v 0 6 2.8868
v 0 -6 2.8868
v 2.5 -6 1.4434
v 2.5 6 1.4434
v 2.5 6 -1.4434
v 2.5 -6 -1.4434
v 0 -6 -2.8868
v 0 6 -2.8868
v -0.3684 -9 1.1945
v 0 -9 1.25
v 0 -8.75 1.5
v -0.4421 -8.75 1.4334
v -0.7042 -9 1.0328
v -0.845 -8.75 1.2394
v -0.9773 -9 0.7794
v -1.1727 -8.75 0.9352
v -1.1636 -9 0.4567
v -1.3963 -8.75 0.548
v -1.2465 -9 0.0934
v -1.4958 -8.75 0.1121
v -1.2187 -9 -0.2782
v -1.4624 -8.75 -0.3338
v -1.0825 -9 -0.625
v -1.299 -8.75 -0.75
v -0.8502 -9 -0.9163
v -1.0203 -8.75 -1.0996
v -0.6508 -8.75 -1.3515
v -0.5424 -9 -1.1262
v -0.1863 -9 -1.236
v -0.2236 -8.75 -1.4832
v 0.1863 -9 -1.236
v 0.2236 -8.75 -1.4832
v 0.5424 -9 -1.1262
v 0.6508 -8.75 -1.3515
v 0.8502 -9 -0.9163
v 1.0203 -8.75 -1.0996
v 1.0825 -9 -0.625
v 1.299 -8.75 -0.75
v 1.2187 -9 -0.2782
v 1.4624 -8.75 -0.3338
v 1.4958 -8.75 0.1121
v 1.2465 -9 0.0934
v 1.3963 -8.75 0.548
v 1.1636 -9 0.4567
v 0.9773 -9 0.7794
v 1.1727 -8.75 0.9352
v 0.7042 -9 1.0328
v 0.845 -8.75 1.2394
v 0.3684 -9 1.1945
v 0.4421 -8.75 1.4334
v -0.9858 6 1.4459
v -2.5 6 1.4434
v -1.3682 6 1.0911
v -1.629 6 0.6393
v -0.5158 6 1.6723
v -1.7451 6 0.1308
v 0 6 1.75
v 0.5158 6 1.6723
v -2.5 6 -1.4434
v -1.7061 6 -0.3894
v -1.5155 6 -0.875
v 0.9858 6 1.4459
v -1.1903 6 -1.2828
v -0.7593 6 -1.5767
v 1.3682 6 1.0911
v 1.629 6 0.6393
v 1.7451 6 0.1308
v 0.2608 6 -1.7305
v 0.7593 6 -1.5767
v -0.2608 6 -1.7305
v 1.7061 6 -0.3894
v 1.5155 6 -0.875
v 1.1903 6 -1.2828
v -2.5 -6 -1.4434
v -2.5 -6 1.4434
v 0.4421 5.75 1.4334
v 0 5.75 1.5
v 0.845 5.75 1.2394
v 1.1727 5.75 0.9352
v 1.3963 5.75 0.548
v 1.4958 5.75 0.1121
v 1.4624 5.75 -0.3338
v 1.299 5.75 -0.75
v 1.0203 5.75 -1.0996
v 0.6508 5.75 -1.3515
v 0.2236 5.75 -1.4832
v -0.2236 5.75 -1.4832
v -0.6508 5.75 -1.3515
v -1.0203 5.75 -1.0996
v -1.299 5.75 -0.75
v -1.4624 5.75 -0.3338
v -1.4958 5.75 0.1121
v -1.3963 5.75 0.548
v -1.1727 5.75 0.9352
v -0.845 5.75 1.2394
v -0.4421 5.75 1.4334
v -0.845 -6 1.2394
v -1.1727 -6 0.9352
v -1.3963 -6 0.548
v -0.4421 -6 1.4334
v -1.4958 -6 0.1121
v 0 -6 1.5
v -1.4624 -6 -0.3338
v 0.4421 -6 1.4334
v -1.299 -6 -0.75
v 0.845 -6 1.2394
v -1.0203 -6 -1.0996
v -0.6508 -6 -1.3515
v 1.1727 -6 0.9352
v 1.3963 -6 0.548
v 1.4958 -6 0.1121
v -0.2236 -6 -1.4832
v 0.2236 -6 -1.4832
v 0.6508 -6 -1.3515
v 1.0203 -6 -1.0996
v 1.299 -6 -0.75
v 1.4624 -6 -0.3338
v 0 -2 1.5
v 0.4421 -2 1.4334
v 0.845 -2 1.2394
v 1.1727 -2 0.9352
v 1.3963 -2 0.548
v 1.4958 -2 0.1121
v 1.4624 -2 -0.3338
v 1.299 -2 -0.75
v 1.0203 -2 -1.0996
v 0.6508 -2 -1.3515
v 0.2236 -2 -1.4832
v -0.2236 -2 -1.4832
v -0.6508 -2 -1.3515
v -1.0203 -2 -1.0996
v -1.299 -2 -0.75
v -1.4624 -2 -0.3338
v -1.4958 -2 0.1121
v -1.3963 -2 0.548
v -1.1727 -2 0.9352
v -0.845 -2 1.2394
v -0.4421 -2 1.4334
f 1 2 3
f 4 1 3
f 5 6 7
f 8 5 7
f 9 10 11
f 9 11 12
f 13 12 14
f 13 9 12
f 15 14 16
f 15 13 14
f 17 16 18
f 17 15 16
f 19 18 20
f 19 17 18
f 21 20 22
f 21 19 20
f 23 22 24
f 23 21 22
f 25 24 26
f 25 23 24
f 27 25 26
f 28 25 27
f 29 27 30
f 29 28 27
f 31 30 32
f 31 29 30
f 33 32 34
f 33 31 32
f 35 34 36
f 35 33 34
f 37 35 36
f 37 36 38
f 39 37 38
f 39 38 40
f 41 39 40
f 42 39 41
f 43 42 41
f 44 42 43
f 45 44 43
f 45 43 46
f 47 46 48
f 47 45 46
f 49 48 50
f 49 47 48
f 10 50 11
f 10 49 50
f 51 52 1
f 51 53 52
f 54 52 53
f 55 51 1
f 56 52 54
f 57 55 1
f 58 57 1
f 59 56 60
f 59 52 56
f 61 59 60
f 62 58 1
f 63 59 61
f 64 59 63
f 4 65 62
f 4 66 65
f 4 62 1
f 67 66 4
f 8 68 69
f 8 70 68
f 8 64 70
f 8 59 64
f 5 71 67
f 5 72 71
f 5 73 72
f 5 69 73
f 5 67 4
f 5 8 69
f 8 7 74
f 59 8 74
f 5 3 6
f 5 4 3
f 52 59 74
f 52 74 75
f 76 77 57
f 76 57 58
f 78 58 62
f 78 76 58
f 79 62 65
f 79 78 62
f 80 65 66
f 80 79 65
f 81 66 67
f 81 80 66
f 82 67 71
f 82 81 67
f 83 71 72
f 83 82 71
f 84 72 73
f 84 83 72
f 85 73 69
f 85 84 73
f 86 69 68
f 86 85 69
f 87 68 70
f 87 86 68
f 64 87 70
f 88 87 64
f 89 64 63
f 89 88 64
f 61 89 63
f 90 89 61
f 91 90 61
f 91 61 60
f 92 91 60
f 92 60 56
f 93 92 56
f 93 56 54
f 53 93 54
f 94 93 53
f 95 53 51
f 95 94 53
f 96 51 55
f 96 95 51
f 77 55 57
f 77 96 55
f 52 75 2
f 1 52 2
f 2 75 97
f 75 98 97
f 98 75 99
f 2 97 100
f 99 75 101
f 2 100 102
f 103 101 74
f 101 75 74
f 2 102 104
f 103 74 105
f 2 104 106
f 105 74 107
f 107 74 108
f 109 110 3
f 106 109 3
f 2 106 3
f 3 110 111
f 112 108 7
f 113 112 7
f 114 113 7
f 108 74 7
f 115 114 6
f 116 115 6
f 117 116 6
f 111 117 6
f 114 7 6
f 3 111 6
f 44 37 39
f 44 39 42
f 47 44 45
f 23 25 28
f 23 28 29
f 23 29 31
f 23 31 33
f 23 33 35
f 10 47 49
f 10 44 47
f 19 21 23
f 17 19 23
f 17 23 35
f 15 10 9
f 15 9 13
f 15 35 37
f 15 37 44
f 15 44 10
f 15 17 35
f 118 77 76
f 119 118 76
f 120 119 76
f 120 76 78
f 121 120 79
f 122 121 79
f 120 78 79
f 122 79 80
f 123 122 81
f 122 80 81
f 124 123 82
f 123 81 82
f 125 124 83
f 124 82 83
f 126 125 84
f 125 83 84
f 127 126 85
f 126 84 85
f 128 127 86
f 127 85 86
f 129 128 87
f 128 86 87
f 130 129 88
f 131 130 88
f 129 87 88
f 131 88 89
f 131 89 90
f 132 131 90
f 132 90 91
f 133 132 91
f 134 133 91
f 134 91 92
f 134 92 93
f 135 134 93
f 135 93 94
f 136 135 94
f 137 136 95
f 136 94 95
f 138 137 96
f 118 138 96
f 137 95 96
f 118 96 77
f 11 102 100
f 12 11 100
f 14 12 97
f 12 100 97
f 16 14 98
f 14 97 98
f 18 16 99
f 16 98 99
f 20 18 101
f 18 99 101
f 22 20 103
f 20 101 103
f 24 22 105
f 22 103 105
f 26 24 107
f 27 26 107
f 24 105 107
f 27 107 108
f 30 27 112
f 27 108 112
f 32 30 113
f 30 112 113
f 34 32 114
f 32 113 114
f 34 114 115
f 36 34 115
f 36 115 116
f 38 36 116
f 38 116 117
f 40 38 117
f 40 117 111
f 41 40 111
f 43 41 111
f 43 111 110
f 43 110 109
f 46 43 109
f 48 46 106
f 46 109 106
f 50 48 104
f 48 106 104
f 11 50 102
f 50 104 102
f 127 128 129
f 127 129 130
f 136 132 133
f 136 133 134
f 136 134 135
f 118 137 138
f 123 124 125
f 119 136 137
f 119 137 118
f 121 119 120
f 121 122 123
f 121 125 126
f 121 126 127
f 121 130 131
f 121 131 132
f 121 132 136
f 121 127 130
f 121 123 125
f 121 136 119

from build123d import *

# Parameters (mm, degrees)
BOSS_EXTRUDE1_DEPTH = 6
SKETCH2_R           = 1.5
CUT_EXTRUDE1_DEPTH  = 8
SKETCH3_R           = 1.5
BOSS_EXTRUDE2_DEPTH = 3
CHAMFER2_SIZE       = 0.25


with BuildPart() as part:
    # Sketch1 → Boss-Extrude1 (new, symmetric)
    with BuildSketch(Plane(origin=(0, 0, 0), x_dir=(1, 0, 0), z_dir=(0, 1, 0))):
        Polygon((0, 2.886751346), (-2.5, 1.443375673), (-2.5, -1.443375673), (0, -2.886751346), (2.5, -1.443375673), (2.5, 1.443375673), align=None)
    extrude(amount=BOSS_EXTRUDE1_DEPTH, both=True)

    # Sketch2 → Cut-Extrude1 (cut)
    with BuildSketch(Plane(origin=(0, 6, 0), x_dir=(1, 0, 0), z_dir=(0, 1, 0))):
        with Locations(Location((0, 0, 0), (0, 0, 270))):
            Circle(SKETCH2_R)
    extrude(amount=-CUT_EXTRUDE1_DEPTH, mode=Mode.SUBTRACT)

    # Sketch3 → Boss-Extrude2 (add)
    with BuildSketch(Plane.XZ.offset(6)):
        with Locations(Location((0, 0, 0), (0, 0, 90))):
            Circle(SKETCH3_R)
    extrude(amount=BOSS_EXTRUDE2_DEPTH)

    # Chamfer2
    chamfer2_edges = [part.edges().sort_by_distance(p)[0] for p in [
        (0, 6, -1.5),
        (0, -9, -1.5),
    ]]
    chamfer(chamfer2_edges, length=CHAMFER2_SIZE)


solid = part.part
